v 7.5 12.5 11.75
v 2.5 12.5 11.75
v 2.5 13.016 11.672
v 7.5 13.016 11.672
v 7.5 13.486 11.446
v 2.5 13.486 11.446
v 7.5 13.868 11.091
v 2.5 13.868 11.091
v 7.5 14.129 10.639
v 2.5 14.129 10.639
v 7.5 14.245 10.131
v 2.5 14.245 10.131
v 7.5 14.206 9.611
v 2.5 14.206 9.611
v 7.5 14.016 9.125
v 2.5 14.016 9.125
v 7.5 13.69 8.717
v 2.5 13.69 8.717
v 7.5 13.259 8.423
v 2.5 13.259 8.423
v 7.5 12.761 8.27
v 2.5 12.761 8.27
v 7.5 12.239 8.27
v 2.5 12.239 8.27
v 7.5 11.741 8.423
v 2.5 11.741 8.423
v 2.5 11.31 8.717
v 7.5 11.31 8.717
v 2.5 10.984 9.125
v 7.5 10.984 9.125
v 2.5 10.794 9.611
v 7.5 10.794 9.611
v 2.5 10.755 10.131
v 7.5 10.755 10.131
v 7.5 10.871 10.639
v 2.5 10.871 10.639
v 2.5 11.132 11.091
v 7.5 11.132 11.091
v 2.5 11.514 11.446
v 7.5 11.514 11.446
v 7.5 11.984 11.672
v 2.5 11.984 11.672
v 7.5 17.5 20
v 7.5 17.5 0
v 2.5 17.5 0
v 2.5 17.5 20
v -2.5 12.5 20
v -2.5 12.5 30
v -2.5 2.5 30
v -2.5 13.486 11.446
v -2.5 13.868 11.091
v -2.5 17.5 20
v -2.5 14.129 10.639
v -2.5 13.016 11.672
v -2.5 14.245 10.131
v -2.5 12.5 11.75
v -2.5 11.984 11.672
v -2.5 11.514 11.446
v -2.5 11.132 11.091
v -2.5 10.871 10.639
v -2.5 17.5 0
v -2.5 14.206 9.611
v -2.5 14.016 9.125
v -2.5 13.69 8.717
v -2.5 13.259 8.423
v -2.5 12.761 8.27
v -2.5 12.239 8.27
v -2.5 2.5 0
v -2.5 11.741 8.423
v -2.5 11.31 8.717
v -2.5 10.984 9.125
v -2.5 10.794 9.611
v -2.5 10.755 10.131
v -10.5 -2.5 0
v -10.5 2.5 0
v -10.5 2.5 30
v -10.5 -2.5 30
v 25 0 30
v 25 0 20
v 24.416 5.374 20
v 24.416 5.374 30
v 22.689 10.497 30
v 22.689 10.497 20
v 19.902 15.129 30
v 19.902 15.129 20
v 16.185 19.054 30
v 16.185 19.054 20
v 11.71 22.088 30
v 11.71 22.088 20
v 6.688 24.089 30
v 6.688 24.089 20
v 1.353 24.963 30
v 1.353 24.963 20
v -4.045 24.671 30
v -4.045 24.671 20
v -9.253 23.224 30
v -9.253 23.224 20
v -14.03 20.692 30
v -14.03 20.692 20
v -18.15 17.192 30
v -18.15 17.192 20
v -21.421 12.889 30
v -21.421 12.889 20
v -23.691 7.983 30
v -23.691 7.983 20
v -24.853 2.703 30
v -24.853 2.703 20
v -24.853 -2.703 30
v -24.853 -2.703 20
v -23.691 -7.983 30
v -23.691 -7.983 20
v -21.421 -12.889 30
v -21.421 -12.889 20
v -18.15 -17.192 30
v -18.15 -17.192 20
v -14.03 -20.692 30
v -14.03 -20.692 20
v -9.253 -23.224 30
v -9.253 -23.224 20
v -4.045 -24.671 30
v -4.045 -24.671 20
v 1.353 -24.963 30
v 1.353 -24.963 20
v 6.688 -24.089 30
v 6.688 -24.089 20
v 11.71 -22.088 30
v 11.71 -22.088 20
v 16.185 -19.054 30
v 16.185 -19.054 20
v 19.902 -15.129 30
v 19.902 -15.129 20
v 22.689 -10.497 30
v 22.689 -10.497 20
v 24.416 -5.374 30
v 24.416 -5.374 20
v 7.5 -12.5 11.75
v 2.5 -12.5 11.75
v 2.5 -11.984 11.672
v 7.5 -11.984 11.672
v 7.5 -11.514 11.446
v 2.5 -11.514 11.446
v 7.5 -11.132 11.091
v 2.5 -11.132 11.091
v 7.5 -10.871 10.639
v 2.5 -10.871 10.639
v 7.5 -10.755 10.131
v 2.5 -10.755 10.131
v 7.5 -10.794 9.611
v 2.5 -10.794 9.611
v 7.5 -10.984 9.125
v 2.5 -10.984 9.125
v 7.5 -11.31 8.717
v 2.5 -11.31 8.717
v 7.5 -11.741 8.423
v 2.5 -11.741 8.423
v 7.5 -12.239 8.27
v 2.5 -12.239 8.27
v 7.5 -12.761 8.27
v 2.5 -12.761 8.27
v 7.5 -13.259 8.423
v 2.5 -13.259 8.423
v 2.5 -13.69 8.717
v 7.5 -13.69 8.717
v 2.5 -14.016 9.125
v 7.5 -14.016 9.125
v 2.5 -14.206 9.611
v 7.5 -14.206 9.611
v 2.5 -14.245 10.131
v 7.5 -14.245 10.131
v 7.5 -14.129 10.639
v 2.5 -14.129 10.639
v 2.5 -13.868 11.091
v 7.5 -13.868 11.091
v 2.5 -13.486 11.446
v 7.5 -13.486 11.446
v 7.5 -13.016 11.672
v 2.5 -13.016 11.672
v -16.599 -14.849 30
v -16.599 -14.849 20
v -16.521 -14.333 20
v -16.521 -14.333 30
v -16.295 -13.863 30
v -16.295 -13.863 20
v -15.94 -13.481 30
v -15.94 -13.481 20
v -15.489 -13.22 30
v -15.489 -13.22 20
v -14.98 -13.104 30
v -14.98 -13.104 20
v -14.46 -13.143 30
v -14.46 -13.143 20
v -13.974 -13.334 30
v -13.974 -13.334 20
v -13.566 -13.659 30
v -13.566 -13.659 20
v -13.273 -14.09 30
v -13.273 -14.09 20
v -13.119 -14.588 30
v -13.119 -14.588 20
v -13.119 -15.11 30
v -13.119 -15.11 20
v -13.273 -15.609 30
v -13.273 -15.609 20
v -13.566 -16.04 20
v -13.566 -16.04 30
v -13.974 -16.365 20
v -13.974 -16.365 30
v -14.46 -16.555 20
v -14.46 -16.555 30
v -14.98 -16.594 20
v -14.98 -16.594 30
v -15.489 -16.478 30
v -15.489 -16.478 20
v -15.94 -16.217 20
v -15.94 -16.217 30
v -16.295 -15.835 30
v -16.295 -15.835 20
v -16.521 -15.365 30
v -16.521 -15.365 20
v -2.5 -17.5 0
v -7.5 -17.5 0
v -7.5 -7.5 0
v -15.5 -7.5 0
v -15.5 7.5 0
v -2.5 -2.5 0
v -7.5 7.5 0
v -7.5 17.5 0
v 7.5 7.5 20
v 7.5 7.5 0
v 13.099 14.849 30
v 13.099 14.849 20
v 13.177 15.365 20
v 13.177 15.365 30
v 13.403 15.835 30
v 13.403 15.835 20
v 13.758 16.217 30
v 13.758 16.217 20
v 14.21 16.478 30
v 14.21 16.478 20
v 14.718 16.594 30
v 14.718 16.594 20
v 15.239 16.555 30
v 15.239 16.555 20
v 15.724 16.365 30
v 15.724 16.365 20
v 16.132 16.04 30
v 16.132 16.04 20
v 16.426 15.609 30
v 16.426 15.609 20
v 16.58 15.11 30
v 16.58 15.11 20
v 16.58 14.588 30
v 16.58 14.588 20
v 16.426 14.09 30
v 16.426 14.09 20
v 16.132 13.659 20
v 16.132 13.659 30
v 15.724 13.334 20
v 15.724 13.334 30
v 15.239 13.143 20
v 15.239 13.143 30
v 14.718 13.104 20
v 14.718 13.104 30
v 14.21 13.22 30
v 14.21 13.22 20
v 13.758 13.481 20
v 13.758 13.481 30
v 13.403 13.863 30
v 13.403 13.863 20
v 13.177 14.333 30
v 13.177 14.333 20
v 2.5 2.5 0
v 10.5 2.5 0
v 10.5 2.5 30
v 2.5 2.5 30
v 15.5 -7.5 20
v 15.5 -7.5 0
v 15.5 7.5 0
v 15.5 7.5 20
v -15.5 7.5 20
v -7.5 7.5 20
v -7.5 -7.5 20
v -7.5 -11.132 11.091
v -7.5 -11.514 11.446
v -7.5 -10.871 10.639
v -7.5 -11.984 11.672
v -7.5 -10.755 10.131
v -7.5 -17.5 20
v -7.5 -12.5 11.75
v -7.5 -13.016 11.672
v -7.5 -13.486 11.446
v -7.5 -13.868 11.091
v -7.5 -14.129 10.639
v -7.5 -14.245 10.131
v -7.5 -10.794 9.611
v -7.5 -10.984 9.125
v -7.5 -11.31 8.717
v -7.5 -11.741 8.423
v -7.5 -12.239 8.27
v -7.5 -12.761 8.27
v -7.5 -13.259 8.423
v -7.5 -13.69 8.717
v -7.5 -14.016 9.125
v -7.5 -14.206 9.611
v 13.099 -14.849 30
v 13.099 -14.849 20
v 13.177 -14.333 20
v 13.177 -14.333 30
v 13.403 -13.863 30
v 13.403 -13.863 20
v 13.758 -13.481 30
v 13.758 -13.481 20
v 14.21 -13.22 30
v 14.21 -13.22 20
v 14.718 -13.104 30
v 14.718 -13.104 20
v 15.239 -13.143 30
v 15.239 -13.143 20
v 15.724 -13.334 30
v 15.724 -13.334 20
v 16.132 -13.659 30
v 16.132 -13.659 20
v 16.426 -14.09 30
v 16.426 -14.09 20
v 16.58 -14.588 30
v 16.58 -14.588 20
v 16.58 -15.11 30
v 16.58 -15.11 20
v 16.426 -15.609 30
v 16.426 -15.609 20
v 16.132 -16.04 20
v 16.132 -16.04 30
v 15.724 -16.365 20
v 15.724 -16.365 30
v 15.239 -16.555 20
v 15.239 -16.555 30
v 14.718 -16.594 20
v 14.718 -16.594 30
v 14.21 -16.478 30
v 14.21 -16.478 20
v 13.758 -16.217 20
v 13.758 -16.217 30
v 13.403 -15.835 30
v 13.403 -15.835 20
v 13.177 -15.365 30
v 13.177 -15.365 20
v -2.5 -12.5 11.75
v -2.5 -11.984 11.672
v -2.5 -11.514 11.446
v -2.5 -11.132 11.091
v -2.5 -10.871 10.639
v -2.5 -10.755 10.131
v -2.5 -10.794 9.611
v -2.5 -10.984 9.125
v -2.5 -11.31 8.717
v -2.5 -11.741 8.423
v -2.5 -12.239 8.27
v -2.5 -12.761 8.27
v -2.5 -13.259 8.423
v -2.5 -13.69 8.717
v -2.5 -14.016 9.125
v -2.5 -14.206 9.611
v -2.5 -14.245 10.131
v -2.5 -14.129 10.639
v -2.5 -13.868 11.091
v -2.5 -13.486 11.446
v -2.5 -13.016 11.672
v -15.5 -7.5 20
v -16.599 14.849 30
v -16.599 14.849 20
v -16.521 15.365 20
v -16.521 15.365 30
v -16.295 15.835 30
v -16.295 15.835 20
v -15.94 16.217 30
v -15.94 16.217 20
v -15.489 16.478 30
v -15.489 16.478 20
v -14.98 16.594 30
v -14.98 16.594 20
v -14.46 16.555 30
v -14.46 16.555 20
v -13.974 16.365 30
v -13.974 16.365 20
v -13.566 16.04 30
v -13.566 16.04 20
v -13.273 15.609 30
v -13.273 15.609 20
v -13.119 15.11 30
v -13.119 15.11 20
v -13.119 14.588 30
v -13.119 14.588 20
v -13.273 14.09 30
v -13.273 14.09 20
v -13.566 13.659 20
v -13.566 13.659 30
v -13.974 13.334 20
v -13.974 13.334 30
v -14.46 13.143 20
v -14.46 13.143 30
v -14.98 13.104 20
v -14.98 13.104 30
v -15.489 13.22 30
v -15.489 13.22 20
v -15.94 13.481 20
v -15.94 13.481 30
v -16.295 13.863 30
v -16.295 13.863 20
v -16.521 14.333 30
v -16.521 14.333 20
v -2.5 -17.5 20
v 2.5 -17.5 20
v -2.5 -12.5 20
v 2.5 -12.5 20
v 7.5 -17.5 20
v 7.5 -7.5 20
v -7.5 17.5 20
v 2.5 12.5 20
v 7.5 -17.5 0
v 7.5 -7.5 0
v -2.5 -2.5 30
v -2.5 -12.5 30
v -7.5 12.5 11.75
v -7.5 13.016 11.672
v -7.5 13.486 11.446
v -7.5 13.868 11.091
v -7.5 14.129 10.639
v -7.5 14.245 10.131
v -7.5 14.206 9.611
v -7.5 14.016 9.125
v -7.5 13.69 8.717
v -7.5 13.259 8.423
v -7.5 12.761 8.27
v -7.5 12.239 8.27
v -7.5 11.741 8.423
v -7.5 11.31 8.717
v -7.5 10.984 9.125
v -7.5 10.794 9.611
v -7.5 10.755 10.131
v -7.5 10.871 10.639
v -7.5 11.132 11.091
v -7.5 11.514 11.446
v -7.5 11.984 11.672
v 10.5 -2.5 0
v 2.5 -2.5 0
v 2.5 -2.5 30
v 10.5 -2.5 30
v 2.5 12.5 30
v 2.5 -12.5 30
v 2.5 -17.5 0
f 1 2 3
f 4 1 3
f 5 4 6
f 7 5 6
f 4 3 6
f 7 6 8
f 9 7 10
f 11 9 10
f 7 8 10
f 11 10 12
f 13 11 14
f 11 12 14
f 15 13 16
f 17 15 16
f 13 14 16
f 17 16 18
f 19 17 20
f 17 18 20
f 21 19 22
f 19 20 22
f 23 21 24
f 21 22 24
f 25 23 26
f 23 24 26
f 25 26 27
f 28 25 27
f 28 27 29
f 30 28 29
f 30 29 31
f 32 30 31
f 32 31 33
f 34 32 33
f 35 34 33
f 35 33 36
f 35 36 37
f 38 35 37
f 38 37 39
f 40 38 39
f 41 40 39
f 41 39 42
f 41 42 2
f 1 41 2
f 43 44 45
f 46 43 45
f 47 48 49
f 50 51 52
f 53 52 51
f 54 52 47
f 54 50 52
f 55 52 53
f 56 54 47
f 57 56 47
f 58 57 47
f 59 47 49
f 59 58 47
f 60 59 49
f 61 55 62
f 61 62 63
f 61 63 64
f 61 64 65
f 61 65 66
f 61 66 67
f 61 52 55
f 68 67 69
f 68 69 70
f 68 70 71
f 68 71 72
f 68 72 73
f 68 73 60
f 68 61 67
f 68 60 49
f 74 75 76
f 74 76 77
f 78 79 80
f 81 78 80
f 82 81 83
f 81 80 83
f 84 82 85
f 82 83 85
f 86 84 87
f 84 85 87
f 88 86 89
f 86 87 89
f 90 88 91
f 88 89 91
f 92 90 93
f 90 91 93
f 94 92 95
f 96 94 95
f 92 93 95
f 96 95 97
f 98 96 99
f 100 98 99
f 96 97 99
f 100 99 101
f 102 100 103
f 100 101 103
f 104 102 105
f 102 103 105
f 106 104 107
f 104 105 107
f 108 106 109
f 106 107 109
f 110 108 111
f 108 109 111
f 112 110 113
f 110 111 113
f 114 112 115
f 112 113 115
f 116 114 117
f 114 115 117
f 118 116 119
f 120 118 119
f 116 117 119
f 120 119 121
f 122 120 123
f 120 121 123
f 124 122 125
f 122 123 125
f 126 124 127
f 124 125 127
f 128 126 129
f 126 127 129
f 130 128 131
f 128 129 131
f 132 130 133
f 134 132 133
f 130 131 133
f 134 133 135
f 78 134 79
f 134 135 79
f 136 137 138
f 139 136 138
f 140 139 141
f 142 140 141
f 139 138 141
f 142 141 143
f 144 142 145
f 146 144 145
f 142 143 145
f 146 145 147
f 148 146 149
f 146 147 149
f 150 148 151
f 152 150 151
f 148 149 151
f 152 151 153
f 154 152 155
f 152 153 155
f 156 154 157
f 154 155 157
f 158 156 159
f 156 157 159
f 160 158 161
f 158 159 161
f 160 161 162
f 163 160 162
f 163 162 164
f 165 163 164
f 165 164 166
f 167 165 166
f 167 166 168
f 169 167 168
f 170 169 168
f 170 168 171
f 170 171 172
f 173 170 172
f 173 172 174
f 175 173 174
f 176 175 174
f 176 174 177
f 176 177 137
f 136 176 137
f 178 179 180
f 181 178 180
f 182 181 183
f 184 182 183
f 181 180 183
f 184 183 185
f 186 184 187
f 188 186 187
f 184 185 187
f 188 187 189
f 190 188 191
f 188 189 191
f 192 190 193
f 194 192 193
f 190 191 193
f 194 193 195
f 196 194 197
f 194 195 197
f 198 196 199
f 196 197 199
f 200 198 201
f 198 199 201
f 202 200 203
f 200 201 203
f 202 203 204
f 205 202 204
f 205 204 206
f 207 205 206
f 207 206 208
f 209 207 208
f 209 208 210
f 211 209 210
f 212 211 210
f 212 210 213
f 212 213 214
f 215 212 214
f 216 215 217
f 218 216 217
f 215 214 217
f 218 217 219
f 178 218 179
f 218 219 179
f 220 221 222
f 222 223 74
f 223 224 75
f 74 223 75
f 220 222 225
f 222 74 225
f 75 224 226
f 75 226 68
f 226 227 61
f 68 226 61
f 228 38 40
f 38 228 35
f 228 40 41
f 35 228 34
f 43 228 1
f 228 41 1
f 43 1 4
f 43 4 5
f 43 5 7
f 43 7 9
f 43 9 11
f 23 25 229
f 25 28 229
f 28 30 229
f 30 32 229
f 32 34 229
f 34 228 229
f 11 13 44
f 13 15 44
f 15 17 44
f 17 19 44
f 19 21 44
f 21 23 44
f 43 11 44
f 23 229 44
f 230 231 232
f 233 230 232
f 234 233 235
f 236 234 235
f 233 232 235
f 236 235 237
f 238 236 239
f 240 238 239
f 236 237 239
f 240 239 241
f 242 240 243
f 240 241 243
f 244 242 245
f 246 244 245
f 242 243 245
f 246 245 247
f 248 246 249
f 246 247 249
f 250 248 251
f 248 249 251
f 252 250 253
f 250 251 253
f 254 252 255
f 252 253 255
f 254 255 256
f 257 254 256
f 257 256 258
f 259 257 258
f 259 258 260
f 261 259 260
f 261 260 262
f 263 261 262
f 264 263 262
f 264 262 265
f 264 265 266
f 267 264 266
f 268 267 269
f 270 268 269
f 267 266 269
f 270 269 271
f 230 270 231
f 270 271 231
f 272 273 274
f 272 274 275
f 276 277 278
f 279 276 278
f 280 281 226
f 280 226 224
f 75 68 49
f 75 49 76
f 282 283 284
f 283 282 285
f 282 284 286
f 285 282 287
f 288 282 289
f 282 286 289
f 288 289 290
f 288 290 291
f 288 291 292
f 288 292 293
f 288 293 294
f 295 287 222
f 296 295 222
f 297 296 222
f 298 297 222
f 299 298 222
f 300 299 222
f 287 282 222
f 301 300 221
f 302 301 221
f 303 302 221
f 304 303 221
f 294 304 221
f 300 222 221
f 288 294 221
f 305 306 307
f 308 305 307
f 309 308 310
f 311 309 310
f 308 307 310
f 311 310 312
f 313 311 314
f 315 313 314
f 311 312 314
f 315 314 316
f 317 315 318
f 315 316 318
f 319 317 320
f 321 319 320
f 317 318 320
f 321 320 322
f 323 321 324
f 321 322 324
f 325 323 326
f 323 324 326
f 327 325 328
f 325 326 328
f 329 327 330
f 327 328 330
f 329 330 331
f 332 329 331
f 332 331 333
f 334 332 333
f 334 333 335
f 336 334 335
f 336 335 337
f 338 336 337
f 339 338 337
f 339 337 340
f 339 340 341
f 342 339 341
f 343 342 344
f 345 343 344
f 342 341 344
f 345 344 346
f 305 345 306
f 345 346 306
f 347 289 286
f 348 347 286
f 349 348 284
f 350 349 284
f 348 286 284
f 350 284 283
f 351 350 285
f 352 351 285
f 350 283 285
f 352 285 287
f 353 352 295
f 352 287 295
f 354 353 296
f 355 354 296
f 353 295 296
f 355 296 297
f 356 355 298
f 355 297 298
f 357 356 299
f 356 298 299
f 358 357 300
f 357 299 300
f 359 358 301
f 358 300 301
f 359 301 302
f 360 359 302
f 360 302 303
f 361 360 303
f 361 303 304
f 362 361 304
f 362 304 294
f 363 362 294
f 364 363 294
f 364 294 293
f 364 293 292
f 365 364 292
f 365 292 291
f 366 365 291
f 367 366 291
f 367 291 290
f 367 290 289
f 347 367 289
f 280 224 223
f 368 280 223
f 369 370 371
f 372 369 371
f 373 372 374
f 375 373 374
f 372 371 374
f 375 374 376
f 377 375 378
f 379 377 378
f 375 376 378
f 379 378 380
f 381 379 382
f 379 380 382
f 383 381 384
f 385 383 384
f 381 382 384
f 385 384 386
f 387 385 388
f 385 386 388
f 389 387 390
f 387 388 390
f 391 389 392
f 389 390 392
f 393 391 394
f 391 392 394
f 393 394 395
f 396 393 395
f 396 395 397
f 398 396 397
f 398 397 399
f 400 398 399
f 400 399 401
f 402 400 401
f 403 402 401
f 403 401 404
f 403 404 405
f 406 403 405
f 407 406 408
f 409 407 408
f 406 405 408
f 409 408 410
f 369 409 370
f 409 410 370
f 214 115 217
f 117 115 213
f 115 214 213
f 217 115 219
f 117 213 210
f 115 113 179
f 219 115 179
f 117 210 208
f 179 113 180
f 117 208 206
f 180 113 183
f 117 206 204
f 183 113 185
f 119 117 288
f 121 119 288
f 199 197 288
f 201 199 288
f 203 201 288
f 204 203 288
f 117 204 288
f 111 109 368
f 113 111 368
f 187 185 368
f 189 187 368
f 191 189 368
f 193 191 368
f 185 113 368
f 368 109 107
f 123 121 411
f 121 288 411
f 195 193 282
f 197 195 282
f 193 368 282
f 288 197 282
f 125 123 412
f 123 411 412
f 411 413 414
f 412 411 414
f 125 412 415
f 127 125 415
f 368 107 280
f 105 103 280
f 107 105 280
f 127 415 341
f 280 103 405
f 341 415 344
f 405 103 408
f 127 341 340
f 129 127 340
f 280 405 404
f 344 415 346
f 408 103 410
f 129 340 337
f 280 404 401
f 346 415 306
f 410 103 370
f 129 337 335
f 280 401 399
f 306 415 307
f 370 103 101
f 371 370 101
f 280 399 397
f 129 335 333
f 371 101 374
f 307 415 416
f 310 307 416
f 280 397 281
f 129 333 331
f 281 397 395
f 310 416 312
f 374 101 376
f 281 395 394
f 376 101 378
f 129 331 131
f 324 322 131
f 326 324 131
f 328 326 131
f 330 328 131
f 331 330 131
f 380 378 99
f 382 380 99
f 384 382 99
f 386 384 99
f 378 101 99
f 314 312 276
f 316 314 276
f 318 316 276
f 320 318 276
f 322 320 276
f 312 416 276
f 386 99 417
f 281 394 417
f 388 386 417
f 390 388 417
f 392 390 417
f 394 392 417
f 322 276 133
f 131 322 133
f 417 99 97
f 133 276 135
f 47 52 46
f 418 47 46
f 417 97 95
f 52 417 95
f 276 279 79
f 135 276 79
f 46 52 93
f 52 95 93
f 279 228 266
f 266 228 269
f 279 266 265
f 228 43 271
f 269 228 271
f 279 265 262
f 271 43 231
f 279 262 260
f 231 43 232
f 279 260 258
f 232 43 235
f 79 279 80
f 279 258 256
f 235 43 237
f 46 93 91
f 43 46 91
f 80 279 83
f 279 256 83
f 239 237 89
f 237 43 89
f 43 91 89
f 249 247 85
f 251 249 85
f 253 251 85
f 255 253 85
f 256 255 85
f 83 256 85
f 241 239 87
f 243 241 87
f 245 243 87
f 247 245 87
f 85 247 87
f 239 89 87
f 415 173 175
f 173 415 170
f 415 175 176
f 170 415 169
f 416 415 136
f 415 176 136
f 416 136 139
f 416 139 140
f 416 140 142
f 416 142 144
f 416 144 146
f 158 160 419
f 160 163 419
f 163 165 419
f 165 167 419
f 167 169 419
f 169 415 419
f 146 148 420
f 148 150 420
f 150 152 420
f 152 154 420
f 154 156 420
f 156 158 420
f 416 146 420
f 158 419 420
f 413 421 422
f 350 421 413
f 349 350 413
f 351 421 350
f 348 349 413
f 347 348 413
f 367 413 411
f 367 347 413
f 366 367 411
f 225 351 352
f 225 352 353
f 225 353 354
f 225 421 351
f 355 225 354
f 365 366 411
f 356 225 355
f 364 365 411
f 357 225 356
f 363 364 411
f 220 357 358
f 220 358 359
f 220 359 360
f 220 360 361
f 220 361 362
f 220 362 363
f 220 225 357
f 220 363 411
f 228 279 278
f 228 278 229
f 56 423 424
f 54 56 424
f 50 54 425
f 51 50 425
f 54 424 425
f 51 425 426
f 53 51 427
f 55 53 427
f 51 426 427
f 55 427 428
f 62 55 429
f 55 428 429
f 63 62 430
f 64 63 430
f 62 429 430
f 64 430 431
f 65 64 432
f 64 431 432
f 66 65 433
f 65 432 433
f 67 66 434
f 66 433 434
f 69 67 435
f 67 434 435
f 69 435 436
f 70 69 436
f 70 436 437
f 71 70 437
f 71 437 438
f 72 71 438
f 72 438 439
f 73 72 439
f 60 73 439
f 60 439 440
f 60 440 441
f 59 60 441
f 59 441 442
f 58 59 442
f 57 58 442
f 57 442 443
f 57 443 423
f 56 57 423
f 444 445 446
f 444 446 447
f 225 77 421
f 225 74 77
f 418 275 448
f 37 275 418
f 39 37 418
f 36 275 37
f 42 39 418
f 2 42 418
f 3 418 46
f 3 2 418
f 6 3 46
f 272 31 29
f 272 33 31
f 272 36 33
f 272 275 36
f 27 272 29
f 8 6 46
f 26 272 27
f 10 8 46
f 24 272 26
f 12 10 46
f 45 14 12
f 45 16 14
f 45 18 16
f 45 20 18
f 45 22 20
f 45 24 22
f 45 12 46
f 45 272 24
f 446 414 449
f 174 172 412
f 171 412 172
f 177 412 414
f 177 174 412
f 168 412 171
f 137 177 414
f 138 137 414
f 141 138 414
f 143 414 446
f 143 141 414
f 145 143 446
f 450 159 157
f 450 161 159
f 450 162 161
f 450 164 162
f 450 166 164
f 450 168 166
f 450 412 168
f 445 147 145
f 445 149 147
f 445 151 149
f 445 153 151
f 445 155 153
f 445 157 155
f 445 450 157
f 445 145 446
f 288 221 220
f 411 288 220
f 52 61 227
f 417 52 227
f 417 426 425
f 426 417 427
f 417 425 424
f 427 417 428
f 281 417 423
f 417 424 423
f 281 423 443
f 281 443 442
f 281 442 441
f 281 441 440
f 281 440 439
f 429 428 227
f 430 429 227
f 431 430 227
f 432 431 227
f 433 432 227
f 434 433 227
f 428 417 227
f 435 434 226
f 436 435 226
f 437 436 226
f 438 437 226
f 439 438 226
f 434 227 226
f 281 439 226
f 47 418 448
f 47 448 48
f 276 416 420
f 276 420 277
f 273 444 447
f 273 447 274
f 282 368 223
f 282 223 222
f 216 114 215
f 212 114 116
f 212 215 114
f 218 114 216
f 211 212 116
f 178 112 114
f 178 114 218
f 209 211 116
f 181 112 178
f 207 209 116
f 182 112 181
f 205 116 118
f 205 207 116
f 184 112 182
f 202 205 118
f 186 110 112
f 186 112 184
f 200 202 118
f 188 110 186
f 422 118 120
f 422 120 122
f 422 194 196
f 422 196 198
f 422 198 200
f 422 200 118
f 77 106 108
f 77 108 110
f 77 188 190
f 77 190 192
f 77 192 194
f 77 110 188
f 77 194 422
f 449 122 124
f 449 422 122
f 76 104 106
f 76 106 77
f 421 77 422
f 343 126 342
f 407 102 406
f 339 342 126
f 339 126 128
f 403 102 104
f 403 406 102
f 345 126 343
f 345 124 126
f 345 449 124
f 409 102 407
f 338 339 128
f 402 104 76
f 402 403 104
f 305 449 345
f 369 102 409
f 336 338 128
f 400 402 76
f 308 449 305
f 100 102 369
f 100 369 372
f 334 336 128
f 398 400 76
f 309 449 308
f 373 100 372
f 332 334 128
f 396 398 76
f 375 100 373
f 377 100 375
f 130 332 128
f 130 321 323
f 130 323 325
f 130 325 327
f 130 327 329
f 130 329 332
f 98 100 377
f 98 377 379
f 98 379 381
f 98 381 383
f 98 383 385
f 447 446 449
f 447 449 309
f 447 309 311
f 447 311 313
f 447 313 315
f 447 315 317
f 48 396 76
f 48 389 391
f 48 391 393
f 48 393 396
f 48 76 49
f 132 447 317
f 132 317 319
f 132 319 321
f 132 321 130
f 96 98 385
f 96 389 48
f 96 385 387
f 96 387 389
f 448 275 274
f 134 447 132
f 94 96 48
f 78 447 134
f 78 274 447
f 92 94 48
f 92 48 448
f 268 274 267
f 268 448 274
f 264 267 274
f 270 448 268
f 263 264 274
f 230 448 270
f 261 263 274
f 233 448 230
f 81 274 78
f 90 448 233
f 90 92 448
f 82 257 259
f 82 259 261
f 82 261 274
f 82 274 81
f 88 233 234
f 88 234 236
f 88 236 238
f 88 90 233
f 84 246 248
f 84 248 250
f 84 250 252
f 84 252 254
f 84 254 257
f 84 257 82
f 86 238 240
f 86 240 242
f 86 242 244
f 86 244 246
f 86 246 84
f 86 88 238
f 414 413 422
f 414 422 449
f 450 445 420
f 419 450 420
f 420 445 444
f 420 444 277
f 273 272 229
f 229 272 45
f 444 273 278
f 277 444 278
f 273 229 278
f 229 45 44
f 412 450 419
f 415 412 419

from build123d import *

# Parameters (mm, degrees)
EXTRUDE_1_DEPTH     = 20
SKETCH_2_R          = 25
EXTRUDE_2_DEPTH     = 10
SKETCH_5_W          = 5
SKETCH_5_H          = 5
CUT_EXTRUDE_2_DEPTH = 20
SKETCH_6_R          = 1.75
CUT_EXTRUDE_3_DEPTH = 10
SKETCH_7_R          = 1.75
CUT_EXTRUDE_4_DEPTH = 38


with BuildPart() as part:
    # 草图1 → 凸台-拉伸1 (new body)
    with BuildSketch(Plane.XY):
        Polygon((-15.5, 7.5), (-15.5, -7.5), (-7.5, -7.5), (-7.5, -17.5), (7.5, -17.5), (7.5, -7.5), (15.5, -7.5), (15.5, 7.5), (7.5, 7.5), (7.5, 17.5), (-7.5, 17.5), (-7.5, 7.5), align=None)
        Polygon((-10.5, 2.5), (-2.5, 2.5), (-2.5, 12.5), (2.5, 12.5), (2.5, 2.5), (10.5, 2.5), (10.5, -2.5), (2.5, -2.5), (2.5, -12.5), (-2.5, -12.5), (-2.5, -2.5), (-10.5, -2.5), align=None, mode=Mode.SUBTRACT)
    extrude(amount=EXTRUDE_1_DEPTH)

    # 草图2 → 凸台-拉伸2 (add)
    with BuildSketch(Plane.XY.offset(20)):
        Circle(SKETCH_2_R)
        Polygon((-10.5, -2.5), (-2.5, -2.5), (-2.5, -12.5), (2.5, -12.5), (2.5, -2.5), (10.5, -2.5), (10.5, 2.5), (2.5, 2.5), (2.5, 12.5), (-2.5, 12.5), (-2.5, 2.5), (-10.5, 2.5), align=None, mode=Mode.SUBTRACT)
    extrude(amount=EXTRUDE_2_DEPTH)

    # 草图5 → 切除-拉伸2 (cut)
    with BuildSketch(Plane(origin=(0, 0, 0), x_dir=(-1, 0, 0), z_dir=(0, 0, -1))):
        with Locations((0, 15)):
            Rectangle(SKETCH_5_W, SKETCH_5_H)
        with Locations((0, -15)):
            Rectangle(SKETCH_5_W, SKETCH_5_H)
    extrude(amount=-CUT_EXTRUDE_2_DEPTH, mode=Mode.SUBTRACT)

    # 草图6 → 切除-拉伸3 (cut)
    with BuildSketch(Plane(origin=(0, 0, 20), x_dir=(-1, 0, 0), z_dir=(0, 0, -1))):
        with Locations((14.849242405, 14.849242405)):
            Circle(SKETCH_6_R)
        with Locations((14.849242405, -14.849242405)):
            Circle(SKETCH_6_R)
        with Locations((-14.849242405, -14.849242405)):
            Circle(SKETCH_6_R)
        with Locations((-14.849242405, 14.849242405)):
            Circle(SKETCH_6_R)
    extrude(amount=-CUT_EXTRUDE_3_DEPTH, mode=Mode.SUBTRACT)

    # 草图7 → 切除-拉伸4 (cut)
    with BuildSketch(Plane.ZY.offset(7.5)):
        with Locations((10, 12.5)):
            Circle(SKETCH_7_R)
        with Locations((10, -12.5)):
            Circle(SKETCH_7_R)
    extrude(amount=-CUT_EXTRUDE_4_DEPTH, mode=Mode.SUBTRACT)


solid = part.part
